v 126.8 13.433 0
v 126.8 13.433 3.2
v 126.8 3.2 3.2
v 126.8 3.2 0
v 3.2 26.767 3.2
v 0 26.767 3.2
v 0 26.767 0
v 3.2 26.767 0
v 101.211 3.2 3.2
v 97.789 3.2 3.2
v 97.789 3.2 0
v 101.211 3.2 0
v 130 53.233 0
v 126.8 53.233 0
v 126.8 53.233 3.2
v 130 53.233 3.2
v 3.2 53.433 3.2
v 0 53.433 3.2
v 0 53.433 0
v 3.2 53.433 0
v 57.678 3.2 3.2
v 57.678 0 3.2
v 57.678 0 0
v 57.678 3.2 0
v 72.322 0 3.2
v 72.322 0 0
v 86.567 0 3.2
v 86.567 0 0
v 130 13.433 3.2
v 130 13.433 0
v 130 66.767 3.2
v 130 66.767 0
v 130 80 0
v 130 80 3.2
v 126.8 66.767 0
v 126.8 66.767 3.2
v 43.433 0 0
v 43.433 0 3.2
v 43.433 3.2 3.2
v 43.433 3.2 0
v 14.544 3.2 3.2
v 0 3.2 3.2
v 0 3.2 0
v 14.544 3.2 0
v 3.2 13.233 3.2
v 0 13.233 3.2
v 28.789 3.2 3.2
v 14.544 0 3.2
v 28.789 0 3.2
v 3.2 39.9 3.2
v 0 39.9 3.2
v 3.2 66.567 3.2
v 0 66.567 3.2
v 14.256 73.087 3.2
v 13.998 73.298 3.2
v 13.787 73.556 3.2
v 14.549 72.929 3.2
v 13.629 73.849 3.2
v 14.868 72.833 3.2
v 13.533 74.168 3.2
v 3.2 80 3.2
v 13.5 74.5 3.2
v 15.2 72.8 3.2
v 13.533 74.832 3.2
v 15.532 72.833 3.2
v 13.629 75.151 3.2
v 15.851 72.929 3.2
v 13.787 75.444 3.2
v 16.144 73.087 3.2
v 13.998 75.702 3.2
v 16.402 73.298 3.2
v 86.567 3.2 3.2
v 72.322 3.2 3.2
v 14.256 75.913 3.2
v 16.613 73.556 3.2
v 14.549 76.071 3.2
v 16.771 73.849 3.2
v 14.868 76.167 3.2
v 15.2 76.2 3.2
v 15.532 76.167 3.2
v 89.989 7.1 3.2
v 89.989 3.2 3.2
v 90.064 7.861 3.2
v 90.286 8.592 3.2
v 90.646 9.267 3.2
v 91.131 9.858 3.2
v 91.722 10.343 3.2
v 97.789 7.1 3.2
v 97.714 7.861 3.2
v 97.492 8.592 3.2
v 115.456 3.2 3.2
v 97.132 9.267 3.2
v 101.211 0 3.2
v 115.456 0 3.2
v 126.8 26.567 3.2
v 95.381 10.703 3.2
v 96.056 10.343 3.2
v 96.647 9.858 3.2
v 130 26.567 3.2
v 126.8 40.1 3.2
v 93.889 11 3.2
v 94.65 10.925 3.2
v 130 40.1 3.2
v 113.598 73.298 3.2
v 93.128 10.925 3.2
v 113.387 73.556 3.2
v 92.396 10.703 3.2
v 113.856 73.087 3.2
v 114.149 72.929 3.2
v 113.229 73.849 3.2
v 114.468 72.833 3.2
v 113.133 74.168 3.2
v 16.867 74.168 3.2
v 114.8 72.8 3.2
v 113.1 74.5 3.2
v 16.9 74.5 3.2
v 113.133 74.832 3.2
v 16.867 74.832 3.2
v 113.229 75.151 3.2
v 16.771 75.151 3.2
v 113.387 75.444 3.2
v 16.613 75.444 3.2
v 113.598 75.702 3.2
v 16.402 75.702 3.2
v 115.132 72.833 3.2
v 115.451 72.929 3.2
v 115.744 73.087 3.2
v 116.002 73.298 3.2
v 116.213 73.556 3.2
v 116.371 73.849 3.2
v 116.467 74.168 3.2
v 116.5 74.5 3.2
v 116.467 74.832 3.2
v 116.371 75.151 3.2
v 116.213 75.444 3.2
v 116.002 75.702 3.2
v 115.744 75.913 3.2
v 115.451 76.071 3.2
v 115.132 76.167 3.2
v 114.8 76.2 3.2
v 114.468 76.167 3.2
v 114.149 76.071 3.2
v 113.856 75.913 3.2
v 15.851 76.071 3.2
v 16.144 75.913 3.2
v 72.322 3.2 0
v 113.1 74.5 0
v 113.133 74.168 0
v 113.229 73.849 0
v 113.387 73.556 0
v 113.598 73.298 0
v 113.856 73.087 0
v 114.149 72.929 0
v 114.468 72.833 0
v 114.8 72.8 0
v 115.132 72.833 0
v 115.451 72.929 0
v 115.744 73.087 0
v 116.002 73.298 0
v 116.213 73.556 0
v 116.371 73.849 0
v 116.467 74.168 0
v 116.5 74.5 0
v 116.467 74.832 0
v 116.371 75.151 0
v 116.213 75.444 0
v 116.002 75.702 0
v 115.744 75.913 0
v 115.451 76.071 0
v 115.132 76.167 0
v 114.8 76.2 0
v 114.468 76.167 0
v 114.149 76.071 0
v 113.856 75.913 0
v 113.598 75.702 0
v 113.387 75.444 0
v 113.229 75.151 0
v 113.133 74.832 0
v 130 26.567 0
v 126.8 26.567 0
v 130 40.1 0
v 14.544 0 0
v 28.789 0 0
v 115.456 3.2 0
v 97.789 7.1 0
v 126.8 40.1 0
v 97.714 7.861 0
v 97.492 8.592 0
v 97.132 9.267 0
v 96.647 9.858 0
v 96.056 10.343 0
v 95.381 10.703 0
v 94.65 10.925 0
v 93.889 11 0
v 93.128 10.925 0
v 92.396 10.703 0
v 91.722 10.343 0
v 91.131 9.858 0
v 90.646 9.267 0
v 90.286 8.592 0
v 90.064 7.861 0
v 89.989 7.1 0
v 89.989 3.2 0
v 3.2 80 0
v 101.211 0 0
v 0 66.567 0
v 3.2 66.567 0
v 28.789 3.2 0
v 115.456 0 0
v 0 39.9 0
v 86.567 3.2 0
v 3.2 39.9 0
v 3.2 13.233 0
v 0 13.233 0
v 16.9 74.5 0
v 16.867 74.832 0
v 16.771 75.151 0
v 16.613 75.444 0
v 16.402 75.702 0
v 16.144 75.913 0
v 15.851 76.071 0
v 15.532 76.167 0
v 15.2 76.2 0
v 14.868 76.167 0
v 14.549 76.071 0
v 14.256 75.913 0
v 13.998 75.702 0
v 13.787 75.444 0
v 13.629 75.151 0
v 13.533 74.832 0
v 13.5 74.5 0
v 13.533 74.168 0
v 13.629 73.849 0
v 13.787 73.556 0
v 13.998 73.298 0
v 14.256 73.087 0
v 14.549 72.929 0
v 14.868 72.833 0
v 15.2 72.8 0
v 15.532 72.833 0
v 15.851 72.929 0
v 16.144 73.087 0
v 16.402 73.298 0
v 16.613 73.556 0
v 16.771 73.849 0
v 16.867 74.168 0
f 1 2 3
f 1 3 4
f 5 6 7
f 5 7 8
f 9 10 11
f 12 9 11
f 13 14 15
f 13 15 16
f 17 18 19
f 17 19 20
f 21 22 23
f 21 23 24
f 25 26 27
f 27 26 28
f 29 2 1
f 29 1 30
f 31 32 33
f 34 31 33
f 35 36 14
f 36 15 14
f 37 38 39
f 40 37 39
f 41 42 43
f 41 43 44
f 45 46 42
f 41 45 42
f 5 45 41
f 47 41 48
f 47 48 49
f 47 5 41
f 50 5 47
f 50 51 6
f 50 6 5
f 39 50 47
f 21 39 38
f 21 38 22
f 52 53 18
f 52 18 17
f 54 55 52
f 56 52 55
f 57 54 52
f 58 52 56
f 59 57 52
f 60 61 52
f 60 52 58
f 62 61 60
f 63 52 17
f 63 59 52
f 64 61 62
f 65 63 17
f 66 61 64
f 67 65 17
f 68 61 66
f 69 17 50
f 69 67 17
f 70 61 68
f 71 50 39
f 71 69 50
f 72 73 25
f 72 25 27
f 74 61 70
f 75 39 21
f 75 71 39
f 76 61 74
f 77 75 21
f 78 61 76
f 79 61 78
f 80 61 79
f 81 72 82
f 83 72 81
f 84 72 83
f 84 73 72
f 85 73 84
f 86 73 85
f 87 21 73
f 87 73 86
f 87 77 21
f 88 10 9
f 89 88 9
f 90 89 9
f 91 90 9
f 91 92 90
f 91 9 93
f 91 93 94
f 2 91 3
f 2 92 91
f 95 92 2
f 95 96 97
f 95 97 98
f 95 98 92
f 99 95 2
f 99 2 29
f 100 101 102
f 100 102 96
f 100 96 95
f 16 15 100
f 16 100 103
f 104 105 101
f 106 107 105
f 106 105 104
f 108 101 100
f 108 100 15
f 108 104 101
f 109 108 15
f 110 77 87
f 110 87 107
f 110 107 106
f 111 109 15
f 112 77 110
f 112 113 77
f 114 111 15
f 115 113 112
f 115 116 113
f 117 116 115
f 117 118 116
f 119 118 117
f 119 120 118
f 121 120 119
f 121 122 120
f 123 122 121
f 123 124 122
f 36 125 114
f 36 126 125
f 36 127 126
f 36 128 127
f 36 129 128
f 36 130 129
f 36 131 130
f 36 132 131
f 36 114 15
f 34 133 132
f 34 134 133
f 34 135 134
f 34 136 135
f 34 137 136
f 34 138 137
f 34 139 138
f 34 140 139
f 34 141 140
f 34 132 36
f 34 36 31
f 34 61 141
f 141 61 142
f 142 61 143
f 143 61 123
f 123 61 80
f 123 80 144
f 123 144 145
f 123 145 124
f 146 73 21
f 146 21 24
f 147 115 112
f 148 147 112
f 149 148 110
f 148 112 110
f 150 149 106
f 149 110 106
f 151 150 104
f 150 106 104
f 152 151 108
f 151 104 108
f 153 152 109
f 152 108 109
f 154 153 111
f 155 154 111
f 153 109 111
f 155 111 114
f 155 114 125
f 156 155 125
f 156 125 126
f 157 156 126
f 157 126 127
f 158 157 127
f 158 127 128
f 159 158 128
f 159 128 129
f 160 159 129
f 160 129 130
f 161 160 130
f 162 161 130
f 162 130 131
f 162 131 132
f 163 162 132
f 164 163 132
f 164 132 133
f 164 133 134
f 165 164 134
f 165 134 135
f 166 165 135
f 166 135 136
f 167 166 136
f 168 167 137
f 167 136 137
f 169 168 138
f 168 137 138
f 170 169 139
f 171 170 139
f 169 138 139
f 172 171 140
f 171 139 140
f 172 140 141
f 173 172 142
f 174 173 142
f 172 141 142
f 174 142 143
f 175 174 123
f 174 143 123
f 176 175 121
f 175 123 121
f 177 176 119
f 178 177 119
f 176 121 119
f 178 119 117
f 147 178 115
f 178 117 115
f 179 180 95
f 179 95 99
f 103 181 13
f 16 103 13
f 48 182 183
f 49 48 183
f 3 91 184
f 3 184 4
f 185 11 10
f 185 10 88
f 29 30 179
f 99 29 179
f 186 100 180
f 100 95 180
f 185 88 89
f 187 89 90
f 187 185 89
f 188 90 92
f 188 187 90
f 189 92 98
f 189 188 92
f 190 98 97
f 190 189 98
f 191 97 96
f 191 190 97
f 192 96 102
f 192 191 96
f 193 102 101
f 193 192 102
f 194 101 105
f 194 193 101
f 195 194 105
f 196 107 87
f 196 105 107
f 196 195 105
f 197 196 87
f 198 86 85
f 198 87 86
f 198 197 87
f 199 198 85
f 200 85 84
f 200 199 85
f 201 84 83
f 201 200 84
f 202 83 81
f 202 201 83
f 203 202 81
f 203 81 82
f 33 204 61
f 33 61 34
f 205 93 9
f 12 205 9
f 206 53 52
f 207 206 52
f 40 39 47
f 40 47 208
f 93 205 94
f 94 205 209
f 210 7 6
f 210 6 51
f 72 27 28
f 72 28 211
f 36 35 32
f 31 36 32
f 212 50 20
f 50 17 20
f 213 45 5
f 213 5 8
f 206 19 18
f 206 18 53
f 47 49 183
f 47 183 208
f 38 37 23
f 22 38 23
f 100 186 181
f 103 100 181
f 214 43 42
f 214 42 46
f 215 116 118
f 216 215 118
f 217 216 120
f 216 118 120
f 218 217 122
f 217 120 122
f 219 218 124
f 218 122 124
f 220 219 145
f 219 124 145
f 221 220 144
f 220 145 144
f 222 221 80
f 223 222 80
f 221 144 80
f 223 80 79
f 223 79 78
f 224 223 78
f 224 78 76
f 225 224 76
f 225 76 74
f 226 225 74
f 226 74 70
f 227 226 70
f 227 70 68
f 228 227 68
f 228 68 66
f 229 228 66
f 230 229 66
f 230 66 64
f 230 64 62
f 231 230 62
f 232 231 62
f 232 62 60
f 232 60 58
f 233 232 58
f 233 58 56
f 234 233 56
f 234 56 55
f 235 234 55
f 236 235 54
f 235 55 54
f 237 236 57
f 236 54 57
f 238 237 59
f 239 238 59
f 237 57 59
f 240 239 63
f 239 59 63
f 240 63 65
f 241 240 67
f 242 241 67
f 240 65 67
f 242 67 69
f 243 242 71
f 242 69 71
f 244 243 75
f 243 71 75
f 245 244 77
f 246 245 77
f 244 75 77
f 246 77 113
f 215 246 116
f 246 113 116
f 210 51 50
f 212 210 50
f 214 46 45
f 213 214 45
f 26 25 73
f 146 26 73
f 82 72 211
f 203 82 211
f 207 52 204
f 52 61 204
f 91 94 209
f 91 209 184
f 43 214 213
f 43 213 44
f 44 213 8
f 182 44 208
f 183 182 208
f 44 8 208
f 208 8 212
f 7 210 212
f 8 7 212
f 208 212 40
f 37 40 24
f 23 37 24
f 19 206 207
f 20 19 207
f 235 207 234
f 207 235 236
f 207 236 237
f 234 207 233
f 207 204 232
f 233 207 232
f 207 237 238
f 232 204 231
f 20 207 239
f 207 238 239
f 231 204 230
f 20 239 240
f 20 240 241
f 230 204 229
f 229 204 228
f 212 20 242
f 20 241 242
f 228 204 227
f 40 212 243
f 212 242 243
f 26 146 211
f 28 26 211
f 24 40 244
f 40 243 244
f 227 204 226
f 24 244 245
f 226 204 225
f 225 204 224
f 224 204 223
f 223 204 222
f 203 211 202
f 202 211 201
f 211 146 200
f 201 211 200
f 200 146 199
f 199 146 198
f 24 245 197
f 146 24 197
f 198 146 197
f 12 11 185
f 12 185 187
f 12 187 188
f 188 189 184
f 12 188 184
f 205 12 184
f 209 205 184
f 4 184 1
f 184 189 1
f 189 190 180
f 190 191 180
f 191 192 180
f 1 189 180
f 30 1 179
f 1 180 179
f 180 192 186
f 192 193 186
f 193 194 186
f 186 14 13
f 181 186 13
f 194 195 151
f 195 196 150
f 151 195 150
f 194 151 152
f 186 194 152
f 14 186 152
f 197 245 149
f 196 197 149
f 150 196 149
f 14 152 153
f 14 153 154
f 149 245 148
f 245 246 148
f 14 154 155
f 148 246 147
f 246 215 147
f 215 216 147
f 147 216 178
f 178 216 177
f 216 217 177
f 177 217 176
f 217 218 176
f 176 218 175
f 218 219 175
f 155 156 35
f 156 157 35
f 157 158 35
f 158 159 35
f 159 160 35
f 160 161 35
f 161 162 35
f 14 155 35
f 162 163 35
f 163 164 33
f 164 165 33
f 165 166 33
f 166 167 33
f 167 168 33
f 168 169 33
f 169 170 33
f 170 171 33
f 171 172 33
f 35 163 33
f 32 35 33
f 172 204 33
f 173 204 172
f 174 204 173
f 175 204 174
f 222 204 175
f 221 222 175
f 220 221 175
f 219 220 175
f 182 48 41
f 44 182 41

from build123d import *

# Parameters (mm, degrees)
SKETCH1_W           = 130
SKETCH1_H           = 80
BOSS_EXTRUDE1_DEPTH = 3.2
SKETCH2_W           = 14.444444444
SKETCH2_H           = 3.2
SKETCH2_W_2         = 3.2
SKETCH2_H_2         = 13.333333334
SKETCH2_H_3         = 13.333333333
CUT_EXTRUDE1_DEPTH  = 153.676913775
MOVE_FACE1_BY       = 0.1
MOVE_FACE1_2_BY     = 0.1
MOVE_FACE1_3_BY     = 0.1
MOVE_FACE1_4_BY     = 0.1
MOVE_FACE1_5_BY     = 0.1
MOVE_FACE1_6_BY     = 0.1
MOVE_FACE1_7_BY     = 0.1
MOVE_FACE1_8_BY     = 0.1
MOVE_FACE1_9_BY     = 0.1
MOVE_FACE1_10_BY    = 0.1
MOVE_FACE1_11_BY    = 0.1
MOVE_FACE1_12_BY    = 0.1
MOVE_FACE1_13_BY    = 0.1
MOVE_FACE1_14_BY    = 0.1
MOVE_FACE1_15_BY    = 0.1
MOVE_FACE1_16_BY    = 0.1
MOVE_FACE1_17_BY    = 0.1
MOVE_FACE1_18_BY    = 0.1
CUT_EXTRUDE2_REACH  = 154.677
SKETCH3_R           = 1.7
CUT_EXTRUDE3_REACH  = 154.677


with BuildPart() as part:
    # Sketch1 → Boss-Extrude1 (new body)
    with BuildSketch(Plane.XY):
        with Locations((65, 40)):
            Rectangle(SKETCH1_W, SKETCH1_H)
    extrude(amount=BOSS_EXTRUDE1_DEPTH)

    # Sketch2 → Cut-Extrude1 (cut, through all)
    with BuildSketch(Plane.XY.offset(3.2)):
        with Locations((7.222222222, 1.6)):
            Rectangle(SKETCH2_W, SKETCH2_H)
        with Locations((36.111111111, 1.6)):
            Rectangle(SKETCH2_W, SKETCH2_H)
        with Locations((65, 1.6)):
            Rectangle(SKETCH2_W, SKETCH2_H)
        with Locations((93.888888889, 1.6)):
            Rectangle(SKETCH2_W, SKETCH2_H)
        Polygon((115.555555556, 0), (115.555555556, 3.2), (126.8, 3.2), (126.8, 13.333333333), (130, 13.333333333), (130, 0), align=None)
        with Locations((1.6, 20)):
            Rectangle(SKETCH2_W_2, SKETCH2_H_2)
        with Locations((1.6, 46.666666667)):
            Rectangle(SKETCH2_W_2, SKETCH2_H_3)
        with Locations((1.6, 73.333333334)):
            Rectangle(SKETCH2_W_2, SKETCH2_H_3)
        with Locations((128.4, 33.333333334)):
            Rectangle(SKETCH2_W_2, SKETCH2_H_3)
        with Locations((128.4, 60)):
            Rectangle(SKETCH2_W_2, SKETCH2_H_2)
    extrude(amount=-CUT_EXTRUDE1_DEPTH, mode=Mode.SUBTRACT)

    # Move Face1: a face moved inward by 0.1
    extrude(part.faces().sort_by_distance((128.4, 53.333333333, 1.6))[0], amount=MOVE_FACE1_BY, dir=(0, -1, 0), mode=Mode.SUBTRACT)

    # Move Face1 2: a face moved inward by 0.1
    extrude(part.faces().sort_by_distance((128.4, 26.666666667, 1.6))[0], amount=MOVE_FACE1_2_BY, dir=(0, -1, 0), mode=Mode.SUBTRACT)

    # Move Face1 3: a face moved inward by 0.1
    extrude(part.faces().sort_by_distance((128.4, 13.333333333, 1.6))[0], amount=MOVE_FACE1_3_BY, dir=(0, 1, 0), mode=Mode.SUBTRACT)

    # Move Face1 4: a face moved inward by 0.1
    extrude(part.faces().sort_by_distance((128.4, 40, 1.6))[0], amount=MOVE_FACE1_4_BY, dir=(0, 1, 0), mode=Mode.SUBTRACT)

    # Move Face1 5: a face moved inward by 0.1
    extrude(part.faces().sort_by_distance((128.4, 66.666666667, 1.6))[0], amount=MOVE_FACE1_5_BY, dir=(0, 1, 0), mode=Mode.SUBTRACT)

    # Move Face1 6: a face moved inward by 0.1
    extrude(part.faces().sort_by_distance((115.555555556, 1.6, 1.6))[0], amount=MOVE_FACE1_6_BY, dir=(-1, 0, 0), mode=Mode.SUBTRACT)

    # Move Face1 7: a face moved inward by 0.1
    extrude(part.faces().sort_by_distance((86.666666667, 1.6, 1.6))[0], amount=MOVE_FACE1_7_BY, dir=(-1, 0, 0), mode=Mode.SUBTRACT)

    # Move Face1 8: a face moved inward by 0.1
    extrude(part.faces().sort_by_distance((57.777777778, 1.6, 1.6))[0], amount=MOVE_FACE1_8_BY, dir=(-1, 0, 0), mode=Mode.SUBTRACT)

    # Move Face1 9: a face moved inward by 0.1
    extrude(part.faces().sort_by_distance((28.888888889, 1.6, 1.6))[0], amount=MOVE_FACE1_9_BY, dir=(-1, 0, 0), mode=Mode.SUBTRACT)

    # Move Face1 10: a face moved inward by 0.1
    extrude(part.faces().sort_by_distance((14.444444444, 1.6, 1.6))[0], amount=MOVE_FACE1_10_BY, dir=(1, 0, 0), mode=Mode.SUBTRACT)

    # Move Face1 11: a face moved inward by 0.1
    extrude(part.faces().sort_by_distance((43.333333333, 1.6, 1.6))[0], amount=MOVE_FACE1_11_BY, dir=(1, 0, 0), mode=Mode.SUBTRACT)

    # Move Face1 12: a face moved inward by 0.1
    extrude(part.faces().sort_by_distance((72.222222222, 1.6, 1.6))[0], amount=MOVE_FACE1_12_BY, dir=(1, 0, 0), mode=Mode.SUBTRACT)

    # Move Face1 13: a face moved inward by 0.1
    extrude(part.faces().sort_by_distance((101.111111111, 1.6, 1.6))[0], amount=MOVE_FACE1_13_BY, dir=(1, 0, 0), mode=Mode.SUBTRACT)

    # Move Face1 14: a face moved inward by 0.1
    extrude(part.faces().sort_by_distance((1.6, 26.666666667, 1.6))[0], amount=MOVE_FACE1_14_BY, dir=(0, 1, 0), mode=Mode.SUBTRACT)

    # Move Face1 15: a face moved inward by 0.1
    extrude(part.faces().sort_by_distance((1.6, 13.333333333, 1.6))[0], amount=MOVE_FACE1_15_BY, dir=(0, -1, 0), mode=Mode.SUBTRACT)

    # Move Face1 16: a face moved inward by 0.1
    extrude(part.faces().sort_by_distance((1.6, 40, 1.6))[0], amount=MOVE_FACE1_16_BY, dir=(0, -1, 0), mode=Mode.SUBTRACT)

    # Move Face1 17: a face moved inward by 0.1
    extrude(part.faces().sort_by_distance((1.6, 53.333333333, 1.6))[0], amount=MOVE_FACE1_17_BY, dir=(0, 1, 0), mode=Mode.SUBTRACT)

    # Move Face1 18: a face moved inward by 0.1
    extrude(part.faces().sort_by_distance((1.6, 66.666666667, 1.6))[0], amount=MOVE_FACE1_18_BY, dir=(0, -1, 0), mode=Mode.SUBTRACT)

    # Sketch3 → Cut-Extrude2 (cut, up to next)
    with BuildSketch(Plane.XY.offset(3.2), mode=Mode.PRIVATE) as cut_extrude2_sk1:
        with Locations((15.2, 74.5)):
            Circle(SKETCH3_R)
    cut_extrude2_tool1 = extrude(cut_extrude2_sk1.sketch, amount=-CUT_EXTRUDE2_REACH, mode=Mode.PRIVATE) & part.part
    # Sketch3 → Cut-Extrude2 (cut, up to next)
    with BuildSketch(Plane.XY.offset(3.2), mode=Mode.PRIVATE) as cut_extrude2_sk2:
        with Locations(Location((114.8, 74.5, 0), (0, 0, 180))):
            Circle(SKETCH3_R)
    cut_extrude2_tool2 = extrude(cut_extrude2_sk2.sketch, amount=-CUT_EXTRUDE2_REACH, mode=Mode.PRIVATE) & part.part
    add(cut_extrude2_tool1.solids().sort_by_distance((15.2, 74.5, 3.2))[0], mode=Mode.SUBTRACT)
    add(cut_extrude2_tool2.solids().sort_by_distance((114.8, 74.5, 3.2))[0], mode=Mode.SUBTRACT)

    # Sketch4 → Cut-Extrude3 (cut, up to next)
    with BuildSketch(Plane(origin=(0, 0, 0), x_dir=(-1, 0, 0), z_dir=(0, 0, -1)), mode=Mode.PRIVATE) as cut_extrude3_sk1:
        with BuildLine():
            Line((-97.788888889, 3.2), (-97.788888889, 7.1))
            ThreePointArc((-97.788888889, 7.1), (-93.888888889, 11), (-89.988888889, 7.1))
            Line((-89.988888889, 7.1), (-89.988888889, 3.2))
            Line((-89.988888889, 3.2), (-97.788888889, 3.2))
        make_face()
    cut_extrude3_tool1 = extrude(cut_extrude3_sk1.sketch, amount=-CUT_EXTRUDE3_REACH, mode=Mode.PRIVATE) & part.part
    add(cut_extrude3_tool1.solids().sort_by_distance((93.888889, 6.735936, 0))[0], mode=Mode.SUBTRACT)


solid = part.part
